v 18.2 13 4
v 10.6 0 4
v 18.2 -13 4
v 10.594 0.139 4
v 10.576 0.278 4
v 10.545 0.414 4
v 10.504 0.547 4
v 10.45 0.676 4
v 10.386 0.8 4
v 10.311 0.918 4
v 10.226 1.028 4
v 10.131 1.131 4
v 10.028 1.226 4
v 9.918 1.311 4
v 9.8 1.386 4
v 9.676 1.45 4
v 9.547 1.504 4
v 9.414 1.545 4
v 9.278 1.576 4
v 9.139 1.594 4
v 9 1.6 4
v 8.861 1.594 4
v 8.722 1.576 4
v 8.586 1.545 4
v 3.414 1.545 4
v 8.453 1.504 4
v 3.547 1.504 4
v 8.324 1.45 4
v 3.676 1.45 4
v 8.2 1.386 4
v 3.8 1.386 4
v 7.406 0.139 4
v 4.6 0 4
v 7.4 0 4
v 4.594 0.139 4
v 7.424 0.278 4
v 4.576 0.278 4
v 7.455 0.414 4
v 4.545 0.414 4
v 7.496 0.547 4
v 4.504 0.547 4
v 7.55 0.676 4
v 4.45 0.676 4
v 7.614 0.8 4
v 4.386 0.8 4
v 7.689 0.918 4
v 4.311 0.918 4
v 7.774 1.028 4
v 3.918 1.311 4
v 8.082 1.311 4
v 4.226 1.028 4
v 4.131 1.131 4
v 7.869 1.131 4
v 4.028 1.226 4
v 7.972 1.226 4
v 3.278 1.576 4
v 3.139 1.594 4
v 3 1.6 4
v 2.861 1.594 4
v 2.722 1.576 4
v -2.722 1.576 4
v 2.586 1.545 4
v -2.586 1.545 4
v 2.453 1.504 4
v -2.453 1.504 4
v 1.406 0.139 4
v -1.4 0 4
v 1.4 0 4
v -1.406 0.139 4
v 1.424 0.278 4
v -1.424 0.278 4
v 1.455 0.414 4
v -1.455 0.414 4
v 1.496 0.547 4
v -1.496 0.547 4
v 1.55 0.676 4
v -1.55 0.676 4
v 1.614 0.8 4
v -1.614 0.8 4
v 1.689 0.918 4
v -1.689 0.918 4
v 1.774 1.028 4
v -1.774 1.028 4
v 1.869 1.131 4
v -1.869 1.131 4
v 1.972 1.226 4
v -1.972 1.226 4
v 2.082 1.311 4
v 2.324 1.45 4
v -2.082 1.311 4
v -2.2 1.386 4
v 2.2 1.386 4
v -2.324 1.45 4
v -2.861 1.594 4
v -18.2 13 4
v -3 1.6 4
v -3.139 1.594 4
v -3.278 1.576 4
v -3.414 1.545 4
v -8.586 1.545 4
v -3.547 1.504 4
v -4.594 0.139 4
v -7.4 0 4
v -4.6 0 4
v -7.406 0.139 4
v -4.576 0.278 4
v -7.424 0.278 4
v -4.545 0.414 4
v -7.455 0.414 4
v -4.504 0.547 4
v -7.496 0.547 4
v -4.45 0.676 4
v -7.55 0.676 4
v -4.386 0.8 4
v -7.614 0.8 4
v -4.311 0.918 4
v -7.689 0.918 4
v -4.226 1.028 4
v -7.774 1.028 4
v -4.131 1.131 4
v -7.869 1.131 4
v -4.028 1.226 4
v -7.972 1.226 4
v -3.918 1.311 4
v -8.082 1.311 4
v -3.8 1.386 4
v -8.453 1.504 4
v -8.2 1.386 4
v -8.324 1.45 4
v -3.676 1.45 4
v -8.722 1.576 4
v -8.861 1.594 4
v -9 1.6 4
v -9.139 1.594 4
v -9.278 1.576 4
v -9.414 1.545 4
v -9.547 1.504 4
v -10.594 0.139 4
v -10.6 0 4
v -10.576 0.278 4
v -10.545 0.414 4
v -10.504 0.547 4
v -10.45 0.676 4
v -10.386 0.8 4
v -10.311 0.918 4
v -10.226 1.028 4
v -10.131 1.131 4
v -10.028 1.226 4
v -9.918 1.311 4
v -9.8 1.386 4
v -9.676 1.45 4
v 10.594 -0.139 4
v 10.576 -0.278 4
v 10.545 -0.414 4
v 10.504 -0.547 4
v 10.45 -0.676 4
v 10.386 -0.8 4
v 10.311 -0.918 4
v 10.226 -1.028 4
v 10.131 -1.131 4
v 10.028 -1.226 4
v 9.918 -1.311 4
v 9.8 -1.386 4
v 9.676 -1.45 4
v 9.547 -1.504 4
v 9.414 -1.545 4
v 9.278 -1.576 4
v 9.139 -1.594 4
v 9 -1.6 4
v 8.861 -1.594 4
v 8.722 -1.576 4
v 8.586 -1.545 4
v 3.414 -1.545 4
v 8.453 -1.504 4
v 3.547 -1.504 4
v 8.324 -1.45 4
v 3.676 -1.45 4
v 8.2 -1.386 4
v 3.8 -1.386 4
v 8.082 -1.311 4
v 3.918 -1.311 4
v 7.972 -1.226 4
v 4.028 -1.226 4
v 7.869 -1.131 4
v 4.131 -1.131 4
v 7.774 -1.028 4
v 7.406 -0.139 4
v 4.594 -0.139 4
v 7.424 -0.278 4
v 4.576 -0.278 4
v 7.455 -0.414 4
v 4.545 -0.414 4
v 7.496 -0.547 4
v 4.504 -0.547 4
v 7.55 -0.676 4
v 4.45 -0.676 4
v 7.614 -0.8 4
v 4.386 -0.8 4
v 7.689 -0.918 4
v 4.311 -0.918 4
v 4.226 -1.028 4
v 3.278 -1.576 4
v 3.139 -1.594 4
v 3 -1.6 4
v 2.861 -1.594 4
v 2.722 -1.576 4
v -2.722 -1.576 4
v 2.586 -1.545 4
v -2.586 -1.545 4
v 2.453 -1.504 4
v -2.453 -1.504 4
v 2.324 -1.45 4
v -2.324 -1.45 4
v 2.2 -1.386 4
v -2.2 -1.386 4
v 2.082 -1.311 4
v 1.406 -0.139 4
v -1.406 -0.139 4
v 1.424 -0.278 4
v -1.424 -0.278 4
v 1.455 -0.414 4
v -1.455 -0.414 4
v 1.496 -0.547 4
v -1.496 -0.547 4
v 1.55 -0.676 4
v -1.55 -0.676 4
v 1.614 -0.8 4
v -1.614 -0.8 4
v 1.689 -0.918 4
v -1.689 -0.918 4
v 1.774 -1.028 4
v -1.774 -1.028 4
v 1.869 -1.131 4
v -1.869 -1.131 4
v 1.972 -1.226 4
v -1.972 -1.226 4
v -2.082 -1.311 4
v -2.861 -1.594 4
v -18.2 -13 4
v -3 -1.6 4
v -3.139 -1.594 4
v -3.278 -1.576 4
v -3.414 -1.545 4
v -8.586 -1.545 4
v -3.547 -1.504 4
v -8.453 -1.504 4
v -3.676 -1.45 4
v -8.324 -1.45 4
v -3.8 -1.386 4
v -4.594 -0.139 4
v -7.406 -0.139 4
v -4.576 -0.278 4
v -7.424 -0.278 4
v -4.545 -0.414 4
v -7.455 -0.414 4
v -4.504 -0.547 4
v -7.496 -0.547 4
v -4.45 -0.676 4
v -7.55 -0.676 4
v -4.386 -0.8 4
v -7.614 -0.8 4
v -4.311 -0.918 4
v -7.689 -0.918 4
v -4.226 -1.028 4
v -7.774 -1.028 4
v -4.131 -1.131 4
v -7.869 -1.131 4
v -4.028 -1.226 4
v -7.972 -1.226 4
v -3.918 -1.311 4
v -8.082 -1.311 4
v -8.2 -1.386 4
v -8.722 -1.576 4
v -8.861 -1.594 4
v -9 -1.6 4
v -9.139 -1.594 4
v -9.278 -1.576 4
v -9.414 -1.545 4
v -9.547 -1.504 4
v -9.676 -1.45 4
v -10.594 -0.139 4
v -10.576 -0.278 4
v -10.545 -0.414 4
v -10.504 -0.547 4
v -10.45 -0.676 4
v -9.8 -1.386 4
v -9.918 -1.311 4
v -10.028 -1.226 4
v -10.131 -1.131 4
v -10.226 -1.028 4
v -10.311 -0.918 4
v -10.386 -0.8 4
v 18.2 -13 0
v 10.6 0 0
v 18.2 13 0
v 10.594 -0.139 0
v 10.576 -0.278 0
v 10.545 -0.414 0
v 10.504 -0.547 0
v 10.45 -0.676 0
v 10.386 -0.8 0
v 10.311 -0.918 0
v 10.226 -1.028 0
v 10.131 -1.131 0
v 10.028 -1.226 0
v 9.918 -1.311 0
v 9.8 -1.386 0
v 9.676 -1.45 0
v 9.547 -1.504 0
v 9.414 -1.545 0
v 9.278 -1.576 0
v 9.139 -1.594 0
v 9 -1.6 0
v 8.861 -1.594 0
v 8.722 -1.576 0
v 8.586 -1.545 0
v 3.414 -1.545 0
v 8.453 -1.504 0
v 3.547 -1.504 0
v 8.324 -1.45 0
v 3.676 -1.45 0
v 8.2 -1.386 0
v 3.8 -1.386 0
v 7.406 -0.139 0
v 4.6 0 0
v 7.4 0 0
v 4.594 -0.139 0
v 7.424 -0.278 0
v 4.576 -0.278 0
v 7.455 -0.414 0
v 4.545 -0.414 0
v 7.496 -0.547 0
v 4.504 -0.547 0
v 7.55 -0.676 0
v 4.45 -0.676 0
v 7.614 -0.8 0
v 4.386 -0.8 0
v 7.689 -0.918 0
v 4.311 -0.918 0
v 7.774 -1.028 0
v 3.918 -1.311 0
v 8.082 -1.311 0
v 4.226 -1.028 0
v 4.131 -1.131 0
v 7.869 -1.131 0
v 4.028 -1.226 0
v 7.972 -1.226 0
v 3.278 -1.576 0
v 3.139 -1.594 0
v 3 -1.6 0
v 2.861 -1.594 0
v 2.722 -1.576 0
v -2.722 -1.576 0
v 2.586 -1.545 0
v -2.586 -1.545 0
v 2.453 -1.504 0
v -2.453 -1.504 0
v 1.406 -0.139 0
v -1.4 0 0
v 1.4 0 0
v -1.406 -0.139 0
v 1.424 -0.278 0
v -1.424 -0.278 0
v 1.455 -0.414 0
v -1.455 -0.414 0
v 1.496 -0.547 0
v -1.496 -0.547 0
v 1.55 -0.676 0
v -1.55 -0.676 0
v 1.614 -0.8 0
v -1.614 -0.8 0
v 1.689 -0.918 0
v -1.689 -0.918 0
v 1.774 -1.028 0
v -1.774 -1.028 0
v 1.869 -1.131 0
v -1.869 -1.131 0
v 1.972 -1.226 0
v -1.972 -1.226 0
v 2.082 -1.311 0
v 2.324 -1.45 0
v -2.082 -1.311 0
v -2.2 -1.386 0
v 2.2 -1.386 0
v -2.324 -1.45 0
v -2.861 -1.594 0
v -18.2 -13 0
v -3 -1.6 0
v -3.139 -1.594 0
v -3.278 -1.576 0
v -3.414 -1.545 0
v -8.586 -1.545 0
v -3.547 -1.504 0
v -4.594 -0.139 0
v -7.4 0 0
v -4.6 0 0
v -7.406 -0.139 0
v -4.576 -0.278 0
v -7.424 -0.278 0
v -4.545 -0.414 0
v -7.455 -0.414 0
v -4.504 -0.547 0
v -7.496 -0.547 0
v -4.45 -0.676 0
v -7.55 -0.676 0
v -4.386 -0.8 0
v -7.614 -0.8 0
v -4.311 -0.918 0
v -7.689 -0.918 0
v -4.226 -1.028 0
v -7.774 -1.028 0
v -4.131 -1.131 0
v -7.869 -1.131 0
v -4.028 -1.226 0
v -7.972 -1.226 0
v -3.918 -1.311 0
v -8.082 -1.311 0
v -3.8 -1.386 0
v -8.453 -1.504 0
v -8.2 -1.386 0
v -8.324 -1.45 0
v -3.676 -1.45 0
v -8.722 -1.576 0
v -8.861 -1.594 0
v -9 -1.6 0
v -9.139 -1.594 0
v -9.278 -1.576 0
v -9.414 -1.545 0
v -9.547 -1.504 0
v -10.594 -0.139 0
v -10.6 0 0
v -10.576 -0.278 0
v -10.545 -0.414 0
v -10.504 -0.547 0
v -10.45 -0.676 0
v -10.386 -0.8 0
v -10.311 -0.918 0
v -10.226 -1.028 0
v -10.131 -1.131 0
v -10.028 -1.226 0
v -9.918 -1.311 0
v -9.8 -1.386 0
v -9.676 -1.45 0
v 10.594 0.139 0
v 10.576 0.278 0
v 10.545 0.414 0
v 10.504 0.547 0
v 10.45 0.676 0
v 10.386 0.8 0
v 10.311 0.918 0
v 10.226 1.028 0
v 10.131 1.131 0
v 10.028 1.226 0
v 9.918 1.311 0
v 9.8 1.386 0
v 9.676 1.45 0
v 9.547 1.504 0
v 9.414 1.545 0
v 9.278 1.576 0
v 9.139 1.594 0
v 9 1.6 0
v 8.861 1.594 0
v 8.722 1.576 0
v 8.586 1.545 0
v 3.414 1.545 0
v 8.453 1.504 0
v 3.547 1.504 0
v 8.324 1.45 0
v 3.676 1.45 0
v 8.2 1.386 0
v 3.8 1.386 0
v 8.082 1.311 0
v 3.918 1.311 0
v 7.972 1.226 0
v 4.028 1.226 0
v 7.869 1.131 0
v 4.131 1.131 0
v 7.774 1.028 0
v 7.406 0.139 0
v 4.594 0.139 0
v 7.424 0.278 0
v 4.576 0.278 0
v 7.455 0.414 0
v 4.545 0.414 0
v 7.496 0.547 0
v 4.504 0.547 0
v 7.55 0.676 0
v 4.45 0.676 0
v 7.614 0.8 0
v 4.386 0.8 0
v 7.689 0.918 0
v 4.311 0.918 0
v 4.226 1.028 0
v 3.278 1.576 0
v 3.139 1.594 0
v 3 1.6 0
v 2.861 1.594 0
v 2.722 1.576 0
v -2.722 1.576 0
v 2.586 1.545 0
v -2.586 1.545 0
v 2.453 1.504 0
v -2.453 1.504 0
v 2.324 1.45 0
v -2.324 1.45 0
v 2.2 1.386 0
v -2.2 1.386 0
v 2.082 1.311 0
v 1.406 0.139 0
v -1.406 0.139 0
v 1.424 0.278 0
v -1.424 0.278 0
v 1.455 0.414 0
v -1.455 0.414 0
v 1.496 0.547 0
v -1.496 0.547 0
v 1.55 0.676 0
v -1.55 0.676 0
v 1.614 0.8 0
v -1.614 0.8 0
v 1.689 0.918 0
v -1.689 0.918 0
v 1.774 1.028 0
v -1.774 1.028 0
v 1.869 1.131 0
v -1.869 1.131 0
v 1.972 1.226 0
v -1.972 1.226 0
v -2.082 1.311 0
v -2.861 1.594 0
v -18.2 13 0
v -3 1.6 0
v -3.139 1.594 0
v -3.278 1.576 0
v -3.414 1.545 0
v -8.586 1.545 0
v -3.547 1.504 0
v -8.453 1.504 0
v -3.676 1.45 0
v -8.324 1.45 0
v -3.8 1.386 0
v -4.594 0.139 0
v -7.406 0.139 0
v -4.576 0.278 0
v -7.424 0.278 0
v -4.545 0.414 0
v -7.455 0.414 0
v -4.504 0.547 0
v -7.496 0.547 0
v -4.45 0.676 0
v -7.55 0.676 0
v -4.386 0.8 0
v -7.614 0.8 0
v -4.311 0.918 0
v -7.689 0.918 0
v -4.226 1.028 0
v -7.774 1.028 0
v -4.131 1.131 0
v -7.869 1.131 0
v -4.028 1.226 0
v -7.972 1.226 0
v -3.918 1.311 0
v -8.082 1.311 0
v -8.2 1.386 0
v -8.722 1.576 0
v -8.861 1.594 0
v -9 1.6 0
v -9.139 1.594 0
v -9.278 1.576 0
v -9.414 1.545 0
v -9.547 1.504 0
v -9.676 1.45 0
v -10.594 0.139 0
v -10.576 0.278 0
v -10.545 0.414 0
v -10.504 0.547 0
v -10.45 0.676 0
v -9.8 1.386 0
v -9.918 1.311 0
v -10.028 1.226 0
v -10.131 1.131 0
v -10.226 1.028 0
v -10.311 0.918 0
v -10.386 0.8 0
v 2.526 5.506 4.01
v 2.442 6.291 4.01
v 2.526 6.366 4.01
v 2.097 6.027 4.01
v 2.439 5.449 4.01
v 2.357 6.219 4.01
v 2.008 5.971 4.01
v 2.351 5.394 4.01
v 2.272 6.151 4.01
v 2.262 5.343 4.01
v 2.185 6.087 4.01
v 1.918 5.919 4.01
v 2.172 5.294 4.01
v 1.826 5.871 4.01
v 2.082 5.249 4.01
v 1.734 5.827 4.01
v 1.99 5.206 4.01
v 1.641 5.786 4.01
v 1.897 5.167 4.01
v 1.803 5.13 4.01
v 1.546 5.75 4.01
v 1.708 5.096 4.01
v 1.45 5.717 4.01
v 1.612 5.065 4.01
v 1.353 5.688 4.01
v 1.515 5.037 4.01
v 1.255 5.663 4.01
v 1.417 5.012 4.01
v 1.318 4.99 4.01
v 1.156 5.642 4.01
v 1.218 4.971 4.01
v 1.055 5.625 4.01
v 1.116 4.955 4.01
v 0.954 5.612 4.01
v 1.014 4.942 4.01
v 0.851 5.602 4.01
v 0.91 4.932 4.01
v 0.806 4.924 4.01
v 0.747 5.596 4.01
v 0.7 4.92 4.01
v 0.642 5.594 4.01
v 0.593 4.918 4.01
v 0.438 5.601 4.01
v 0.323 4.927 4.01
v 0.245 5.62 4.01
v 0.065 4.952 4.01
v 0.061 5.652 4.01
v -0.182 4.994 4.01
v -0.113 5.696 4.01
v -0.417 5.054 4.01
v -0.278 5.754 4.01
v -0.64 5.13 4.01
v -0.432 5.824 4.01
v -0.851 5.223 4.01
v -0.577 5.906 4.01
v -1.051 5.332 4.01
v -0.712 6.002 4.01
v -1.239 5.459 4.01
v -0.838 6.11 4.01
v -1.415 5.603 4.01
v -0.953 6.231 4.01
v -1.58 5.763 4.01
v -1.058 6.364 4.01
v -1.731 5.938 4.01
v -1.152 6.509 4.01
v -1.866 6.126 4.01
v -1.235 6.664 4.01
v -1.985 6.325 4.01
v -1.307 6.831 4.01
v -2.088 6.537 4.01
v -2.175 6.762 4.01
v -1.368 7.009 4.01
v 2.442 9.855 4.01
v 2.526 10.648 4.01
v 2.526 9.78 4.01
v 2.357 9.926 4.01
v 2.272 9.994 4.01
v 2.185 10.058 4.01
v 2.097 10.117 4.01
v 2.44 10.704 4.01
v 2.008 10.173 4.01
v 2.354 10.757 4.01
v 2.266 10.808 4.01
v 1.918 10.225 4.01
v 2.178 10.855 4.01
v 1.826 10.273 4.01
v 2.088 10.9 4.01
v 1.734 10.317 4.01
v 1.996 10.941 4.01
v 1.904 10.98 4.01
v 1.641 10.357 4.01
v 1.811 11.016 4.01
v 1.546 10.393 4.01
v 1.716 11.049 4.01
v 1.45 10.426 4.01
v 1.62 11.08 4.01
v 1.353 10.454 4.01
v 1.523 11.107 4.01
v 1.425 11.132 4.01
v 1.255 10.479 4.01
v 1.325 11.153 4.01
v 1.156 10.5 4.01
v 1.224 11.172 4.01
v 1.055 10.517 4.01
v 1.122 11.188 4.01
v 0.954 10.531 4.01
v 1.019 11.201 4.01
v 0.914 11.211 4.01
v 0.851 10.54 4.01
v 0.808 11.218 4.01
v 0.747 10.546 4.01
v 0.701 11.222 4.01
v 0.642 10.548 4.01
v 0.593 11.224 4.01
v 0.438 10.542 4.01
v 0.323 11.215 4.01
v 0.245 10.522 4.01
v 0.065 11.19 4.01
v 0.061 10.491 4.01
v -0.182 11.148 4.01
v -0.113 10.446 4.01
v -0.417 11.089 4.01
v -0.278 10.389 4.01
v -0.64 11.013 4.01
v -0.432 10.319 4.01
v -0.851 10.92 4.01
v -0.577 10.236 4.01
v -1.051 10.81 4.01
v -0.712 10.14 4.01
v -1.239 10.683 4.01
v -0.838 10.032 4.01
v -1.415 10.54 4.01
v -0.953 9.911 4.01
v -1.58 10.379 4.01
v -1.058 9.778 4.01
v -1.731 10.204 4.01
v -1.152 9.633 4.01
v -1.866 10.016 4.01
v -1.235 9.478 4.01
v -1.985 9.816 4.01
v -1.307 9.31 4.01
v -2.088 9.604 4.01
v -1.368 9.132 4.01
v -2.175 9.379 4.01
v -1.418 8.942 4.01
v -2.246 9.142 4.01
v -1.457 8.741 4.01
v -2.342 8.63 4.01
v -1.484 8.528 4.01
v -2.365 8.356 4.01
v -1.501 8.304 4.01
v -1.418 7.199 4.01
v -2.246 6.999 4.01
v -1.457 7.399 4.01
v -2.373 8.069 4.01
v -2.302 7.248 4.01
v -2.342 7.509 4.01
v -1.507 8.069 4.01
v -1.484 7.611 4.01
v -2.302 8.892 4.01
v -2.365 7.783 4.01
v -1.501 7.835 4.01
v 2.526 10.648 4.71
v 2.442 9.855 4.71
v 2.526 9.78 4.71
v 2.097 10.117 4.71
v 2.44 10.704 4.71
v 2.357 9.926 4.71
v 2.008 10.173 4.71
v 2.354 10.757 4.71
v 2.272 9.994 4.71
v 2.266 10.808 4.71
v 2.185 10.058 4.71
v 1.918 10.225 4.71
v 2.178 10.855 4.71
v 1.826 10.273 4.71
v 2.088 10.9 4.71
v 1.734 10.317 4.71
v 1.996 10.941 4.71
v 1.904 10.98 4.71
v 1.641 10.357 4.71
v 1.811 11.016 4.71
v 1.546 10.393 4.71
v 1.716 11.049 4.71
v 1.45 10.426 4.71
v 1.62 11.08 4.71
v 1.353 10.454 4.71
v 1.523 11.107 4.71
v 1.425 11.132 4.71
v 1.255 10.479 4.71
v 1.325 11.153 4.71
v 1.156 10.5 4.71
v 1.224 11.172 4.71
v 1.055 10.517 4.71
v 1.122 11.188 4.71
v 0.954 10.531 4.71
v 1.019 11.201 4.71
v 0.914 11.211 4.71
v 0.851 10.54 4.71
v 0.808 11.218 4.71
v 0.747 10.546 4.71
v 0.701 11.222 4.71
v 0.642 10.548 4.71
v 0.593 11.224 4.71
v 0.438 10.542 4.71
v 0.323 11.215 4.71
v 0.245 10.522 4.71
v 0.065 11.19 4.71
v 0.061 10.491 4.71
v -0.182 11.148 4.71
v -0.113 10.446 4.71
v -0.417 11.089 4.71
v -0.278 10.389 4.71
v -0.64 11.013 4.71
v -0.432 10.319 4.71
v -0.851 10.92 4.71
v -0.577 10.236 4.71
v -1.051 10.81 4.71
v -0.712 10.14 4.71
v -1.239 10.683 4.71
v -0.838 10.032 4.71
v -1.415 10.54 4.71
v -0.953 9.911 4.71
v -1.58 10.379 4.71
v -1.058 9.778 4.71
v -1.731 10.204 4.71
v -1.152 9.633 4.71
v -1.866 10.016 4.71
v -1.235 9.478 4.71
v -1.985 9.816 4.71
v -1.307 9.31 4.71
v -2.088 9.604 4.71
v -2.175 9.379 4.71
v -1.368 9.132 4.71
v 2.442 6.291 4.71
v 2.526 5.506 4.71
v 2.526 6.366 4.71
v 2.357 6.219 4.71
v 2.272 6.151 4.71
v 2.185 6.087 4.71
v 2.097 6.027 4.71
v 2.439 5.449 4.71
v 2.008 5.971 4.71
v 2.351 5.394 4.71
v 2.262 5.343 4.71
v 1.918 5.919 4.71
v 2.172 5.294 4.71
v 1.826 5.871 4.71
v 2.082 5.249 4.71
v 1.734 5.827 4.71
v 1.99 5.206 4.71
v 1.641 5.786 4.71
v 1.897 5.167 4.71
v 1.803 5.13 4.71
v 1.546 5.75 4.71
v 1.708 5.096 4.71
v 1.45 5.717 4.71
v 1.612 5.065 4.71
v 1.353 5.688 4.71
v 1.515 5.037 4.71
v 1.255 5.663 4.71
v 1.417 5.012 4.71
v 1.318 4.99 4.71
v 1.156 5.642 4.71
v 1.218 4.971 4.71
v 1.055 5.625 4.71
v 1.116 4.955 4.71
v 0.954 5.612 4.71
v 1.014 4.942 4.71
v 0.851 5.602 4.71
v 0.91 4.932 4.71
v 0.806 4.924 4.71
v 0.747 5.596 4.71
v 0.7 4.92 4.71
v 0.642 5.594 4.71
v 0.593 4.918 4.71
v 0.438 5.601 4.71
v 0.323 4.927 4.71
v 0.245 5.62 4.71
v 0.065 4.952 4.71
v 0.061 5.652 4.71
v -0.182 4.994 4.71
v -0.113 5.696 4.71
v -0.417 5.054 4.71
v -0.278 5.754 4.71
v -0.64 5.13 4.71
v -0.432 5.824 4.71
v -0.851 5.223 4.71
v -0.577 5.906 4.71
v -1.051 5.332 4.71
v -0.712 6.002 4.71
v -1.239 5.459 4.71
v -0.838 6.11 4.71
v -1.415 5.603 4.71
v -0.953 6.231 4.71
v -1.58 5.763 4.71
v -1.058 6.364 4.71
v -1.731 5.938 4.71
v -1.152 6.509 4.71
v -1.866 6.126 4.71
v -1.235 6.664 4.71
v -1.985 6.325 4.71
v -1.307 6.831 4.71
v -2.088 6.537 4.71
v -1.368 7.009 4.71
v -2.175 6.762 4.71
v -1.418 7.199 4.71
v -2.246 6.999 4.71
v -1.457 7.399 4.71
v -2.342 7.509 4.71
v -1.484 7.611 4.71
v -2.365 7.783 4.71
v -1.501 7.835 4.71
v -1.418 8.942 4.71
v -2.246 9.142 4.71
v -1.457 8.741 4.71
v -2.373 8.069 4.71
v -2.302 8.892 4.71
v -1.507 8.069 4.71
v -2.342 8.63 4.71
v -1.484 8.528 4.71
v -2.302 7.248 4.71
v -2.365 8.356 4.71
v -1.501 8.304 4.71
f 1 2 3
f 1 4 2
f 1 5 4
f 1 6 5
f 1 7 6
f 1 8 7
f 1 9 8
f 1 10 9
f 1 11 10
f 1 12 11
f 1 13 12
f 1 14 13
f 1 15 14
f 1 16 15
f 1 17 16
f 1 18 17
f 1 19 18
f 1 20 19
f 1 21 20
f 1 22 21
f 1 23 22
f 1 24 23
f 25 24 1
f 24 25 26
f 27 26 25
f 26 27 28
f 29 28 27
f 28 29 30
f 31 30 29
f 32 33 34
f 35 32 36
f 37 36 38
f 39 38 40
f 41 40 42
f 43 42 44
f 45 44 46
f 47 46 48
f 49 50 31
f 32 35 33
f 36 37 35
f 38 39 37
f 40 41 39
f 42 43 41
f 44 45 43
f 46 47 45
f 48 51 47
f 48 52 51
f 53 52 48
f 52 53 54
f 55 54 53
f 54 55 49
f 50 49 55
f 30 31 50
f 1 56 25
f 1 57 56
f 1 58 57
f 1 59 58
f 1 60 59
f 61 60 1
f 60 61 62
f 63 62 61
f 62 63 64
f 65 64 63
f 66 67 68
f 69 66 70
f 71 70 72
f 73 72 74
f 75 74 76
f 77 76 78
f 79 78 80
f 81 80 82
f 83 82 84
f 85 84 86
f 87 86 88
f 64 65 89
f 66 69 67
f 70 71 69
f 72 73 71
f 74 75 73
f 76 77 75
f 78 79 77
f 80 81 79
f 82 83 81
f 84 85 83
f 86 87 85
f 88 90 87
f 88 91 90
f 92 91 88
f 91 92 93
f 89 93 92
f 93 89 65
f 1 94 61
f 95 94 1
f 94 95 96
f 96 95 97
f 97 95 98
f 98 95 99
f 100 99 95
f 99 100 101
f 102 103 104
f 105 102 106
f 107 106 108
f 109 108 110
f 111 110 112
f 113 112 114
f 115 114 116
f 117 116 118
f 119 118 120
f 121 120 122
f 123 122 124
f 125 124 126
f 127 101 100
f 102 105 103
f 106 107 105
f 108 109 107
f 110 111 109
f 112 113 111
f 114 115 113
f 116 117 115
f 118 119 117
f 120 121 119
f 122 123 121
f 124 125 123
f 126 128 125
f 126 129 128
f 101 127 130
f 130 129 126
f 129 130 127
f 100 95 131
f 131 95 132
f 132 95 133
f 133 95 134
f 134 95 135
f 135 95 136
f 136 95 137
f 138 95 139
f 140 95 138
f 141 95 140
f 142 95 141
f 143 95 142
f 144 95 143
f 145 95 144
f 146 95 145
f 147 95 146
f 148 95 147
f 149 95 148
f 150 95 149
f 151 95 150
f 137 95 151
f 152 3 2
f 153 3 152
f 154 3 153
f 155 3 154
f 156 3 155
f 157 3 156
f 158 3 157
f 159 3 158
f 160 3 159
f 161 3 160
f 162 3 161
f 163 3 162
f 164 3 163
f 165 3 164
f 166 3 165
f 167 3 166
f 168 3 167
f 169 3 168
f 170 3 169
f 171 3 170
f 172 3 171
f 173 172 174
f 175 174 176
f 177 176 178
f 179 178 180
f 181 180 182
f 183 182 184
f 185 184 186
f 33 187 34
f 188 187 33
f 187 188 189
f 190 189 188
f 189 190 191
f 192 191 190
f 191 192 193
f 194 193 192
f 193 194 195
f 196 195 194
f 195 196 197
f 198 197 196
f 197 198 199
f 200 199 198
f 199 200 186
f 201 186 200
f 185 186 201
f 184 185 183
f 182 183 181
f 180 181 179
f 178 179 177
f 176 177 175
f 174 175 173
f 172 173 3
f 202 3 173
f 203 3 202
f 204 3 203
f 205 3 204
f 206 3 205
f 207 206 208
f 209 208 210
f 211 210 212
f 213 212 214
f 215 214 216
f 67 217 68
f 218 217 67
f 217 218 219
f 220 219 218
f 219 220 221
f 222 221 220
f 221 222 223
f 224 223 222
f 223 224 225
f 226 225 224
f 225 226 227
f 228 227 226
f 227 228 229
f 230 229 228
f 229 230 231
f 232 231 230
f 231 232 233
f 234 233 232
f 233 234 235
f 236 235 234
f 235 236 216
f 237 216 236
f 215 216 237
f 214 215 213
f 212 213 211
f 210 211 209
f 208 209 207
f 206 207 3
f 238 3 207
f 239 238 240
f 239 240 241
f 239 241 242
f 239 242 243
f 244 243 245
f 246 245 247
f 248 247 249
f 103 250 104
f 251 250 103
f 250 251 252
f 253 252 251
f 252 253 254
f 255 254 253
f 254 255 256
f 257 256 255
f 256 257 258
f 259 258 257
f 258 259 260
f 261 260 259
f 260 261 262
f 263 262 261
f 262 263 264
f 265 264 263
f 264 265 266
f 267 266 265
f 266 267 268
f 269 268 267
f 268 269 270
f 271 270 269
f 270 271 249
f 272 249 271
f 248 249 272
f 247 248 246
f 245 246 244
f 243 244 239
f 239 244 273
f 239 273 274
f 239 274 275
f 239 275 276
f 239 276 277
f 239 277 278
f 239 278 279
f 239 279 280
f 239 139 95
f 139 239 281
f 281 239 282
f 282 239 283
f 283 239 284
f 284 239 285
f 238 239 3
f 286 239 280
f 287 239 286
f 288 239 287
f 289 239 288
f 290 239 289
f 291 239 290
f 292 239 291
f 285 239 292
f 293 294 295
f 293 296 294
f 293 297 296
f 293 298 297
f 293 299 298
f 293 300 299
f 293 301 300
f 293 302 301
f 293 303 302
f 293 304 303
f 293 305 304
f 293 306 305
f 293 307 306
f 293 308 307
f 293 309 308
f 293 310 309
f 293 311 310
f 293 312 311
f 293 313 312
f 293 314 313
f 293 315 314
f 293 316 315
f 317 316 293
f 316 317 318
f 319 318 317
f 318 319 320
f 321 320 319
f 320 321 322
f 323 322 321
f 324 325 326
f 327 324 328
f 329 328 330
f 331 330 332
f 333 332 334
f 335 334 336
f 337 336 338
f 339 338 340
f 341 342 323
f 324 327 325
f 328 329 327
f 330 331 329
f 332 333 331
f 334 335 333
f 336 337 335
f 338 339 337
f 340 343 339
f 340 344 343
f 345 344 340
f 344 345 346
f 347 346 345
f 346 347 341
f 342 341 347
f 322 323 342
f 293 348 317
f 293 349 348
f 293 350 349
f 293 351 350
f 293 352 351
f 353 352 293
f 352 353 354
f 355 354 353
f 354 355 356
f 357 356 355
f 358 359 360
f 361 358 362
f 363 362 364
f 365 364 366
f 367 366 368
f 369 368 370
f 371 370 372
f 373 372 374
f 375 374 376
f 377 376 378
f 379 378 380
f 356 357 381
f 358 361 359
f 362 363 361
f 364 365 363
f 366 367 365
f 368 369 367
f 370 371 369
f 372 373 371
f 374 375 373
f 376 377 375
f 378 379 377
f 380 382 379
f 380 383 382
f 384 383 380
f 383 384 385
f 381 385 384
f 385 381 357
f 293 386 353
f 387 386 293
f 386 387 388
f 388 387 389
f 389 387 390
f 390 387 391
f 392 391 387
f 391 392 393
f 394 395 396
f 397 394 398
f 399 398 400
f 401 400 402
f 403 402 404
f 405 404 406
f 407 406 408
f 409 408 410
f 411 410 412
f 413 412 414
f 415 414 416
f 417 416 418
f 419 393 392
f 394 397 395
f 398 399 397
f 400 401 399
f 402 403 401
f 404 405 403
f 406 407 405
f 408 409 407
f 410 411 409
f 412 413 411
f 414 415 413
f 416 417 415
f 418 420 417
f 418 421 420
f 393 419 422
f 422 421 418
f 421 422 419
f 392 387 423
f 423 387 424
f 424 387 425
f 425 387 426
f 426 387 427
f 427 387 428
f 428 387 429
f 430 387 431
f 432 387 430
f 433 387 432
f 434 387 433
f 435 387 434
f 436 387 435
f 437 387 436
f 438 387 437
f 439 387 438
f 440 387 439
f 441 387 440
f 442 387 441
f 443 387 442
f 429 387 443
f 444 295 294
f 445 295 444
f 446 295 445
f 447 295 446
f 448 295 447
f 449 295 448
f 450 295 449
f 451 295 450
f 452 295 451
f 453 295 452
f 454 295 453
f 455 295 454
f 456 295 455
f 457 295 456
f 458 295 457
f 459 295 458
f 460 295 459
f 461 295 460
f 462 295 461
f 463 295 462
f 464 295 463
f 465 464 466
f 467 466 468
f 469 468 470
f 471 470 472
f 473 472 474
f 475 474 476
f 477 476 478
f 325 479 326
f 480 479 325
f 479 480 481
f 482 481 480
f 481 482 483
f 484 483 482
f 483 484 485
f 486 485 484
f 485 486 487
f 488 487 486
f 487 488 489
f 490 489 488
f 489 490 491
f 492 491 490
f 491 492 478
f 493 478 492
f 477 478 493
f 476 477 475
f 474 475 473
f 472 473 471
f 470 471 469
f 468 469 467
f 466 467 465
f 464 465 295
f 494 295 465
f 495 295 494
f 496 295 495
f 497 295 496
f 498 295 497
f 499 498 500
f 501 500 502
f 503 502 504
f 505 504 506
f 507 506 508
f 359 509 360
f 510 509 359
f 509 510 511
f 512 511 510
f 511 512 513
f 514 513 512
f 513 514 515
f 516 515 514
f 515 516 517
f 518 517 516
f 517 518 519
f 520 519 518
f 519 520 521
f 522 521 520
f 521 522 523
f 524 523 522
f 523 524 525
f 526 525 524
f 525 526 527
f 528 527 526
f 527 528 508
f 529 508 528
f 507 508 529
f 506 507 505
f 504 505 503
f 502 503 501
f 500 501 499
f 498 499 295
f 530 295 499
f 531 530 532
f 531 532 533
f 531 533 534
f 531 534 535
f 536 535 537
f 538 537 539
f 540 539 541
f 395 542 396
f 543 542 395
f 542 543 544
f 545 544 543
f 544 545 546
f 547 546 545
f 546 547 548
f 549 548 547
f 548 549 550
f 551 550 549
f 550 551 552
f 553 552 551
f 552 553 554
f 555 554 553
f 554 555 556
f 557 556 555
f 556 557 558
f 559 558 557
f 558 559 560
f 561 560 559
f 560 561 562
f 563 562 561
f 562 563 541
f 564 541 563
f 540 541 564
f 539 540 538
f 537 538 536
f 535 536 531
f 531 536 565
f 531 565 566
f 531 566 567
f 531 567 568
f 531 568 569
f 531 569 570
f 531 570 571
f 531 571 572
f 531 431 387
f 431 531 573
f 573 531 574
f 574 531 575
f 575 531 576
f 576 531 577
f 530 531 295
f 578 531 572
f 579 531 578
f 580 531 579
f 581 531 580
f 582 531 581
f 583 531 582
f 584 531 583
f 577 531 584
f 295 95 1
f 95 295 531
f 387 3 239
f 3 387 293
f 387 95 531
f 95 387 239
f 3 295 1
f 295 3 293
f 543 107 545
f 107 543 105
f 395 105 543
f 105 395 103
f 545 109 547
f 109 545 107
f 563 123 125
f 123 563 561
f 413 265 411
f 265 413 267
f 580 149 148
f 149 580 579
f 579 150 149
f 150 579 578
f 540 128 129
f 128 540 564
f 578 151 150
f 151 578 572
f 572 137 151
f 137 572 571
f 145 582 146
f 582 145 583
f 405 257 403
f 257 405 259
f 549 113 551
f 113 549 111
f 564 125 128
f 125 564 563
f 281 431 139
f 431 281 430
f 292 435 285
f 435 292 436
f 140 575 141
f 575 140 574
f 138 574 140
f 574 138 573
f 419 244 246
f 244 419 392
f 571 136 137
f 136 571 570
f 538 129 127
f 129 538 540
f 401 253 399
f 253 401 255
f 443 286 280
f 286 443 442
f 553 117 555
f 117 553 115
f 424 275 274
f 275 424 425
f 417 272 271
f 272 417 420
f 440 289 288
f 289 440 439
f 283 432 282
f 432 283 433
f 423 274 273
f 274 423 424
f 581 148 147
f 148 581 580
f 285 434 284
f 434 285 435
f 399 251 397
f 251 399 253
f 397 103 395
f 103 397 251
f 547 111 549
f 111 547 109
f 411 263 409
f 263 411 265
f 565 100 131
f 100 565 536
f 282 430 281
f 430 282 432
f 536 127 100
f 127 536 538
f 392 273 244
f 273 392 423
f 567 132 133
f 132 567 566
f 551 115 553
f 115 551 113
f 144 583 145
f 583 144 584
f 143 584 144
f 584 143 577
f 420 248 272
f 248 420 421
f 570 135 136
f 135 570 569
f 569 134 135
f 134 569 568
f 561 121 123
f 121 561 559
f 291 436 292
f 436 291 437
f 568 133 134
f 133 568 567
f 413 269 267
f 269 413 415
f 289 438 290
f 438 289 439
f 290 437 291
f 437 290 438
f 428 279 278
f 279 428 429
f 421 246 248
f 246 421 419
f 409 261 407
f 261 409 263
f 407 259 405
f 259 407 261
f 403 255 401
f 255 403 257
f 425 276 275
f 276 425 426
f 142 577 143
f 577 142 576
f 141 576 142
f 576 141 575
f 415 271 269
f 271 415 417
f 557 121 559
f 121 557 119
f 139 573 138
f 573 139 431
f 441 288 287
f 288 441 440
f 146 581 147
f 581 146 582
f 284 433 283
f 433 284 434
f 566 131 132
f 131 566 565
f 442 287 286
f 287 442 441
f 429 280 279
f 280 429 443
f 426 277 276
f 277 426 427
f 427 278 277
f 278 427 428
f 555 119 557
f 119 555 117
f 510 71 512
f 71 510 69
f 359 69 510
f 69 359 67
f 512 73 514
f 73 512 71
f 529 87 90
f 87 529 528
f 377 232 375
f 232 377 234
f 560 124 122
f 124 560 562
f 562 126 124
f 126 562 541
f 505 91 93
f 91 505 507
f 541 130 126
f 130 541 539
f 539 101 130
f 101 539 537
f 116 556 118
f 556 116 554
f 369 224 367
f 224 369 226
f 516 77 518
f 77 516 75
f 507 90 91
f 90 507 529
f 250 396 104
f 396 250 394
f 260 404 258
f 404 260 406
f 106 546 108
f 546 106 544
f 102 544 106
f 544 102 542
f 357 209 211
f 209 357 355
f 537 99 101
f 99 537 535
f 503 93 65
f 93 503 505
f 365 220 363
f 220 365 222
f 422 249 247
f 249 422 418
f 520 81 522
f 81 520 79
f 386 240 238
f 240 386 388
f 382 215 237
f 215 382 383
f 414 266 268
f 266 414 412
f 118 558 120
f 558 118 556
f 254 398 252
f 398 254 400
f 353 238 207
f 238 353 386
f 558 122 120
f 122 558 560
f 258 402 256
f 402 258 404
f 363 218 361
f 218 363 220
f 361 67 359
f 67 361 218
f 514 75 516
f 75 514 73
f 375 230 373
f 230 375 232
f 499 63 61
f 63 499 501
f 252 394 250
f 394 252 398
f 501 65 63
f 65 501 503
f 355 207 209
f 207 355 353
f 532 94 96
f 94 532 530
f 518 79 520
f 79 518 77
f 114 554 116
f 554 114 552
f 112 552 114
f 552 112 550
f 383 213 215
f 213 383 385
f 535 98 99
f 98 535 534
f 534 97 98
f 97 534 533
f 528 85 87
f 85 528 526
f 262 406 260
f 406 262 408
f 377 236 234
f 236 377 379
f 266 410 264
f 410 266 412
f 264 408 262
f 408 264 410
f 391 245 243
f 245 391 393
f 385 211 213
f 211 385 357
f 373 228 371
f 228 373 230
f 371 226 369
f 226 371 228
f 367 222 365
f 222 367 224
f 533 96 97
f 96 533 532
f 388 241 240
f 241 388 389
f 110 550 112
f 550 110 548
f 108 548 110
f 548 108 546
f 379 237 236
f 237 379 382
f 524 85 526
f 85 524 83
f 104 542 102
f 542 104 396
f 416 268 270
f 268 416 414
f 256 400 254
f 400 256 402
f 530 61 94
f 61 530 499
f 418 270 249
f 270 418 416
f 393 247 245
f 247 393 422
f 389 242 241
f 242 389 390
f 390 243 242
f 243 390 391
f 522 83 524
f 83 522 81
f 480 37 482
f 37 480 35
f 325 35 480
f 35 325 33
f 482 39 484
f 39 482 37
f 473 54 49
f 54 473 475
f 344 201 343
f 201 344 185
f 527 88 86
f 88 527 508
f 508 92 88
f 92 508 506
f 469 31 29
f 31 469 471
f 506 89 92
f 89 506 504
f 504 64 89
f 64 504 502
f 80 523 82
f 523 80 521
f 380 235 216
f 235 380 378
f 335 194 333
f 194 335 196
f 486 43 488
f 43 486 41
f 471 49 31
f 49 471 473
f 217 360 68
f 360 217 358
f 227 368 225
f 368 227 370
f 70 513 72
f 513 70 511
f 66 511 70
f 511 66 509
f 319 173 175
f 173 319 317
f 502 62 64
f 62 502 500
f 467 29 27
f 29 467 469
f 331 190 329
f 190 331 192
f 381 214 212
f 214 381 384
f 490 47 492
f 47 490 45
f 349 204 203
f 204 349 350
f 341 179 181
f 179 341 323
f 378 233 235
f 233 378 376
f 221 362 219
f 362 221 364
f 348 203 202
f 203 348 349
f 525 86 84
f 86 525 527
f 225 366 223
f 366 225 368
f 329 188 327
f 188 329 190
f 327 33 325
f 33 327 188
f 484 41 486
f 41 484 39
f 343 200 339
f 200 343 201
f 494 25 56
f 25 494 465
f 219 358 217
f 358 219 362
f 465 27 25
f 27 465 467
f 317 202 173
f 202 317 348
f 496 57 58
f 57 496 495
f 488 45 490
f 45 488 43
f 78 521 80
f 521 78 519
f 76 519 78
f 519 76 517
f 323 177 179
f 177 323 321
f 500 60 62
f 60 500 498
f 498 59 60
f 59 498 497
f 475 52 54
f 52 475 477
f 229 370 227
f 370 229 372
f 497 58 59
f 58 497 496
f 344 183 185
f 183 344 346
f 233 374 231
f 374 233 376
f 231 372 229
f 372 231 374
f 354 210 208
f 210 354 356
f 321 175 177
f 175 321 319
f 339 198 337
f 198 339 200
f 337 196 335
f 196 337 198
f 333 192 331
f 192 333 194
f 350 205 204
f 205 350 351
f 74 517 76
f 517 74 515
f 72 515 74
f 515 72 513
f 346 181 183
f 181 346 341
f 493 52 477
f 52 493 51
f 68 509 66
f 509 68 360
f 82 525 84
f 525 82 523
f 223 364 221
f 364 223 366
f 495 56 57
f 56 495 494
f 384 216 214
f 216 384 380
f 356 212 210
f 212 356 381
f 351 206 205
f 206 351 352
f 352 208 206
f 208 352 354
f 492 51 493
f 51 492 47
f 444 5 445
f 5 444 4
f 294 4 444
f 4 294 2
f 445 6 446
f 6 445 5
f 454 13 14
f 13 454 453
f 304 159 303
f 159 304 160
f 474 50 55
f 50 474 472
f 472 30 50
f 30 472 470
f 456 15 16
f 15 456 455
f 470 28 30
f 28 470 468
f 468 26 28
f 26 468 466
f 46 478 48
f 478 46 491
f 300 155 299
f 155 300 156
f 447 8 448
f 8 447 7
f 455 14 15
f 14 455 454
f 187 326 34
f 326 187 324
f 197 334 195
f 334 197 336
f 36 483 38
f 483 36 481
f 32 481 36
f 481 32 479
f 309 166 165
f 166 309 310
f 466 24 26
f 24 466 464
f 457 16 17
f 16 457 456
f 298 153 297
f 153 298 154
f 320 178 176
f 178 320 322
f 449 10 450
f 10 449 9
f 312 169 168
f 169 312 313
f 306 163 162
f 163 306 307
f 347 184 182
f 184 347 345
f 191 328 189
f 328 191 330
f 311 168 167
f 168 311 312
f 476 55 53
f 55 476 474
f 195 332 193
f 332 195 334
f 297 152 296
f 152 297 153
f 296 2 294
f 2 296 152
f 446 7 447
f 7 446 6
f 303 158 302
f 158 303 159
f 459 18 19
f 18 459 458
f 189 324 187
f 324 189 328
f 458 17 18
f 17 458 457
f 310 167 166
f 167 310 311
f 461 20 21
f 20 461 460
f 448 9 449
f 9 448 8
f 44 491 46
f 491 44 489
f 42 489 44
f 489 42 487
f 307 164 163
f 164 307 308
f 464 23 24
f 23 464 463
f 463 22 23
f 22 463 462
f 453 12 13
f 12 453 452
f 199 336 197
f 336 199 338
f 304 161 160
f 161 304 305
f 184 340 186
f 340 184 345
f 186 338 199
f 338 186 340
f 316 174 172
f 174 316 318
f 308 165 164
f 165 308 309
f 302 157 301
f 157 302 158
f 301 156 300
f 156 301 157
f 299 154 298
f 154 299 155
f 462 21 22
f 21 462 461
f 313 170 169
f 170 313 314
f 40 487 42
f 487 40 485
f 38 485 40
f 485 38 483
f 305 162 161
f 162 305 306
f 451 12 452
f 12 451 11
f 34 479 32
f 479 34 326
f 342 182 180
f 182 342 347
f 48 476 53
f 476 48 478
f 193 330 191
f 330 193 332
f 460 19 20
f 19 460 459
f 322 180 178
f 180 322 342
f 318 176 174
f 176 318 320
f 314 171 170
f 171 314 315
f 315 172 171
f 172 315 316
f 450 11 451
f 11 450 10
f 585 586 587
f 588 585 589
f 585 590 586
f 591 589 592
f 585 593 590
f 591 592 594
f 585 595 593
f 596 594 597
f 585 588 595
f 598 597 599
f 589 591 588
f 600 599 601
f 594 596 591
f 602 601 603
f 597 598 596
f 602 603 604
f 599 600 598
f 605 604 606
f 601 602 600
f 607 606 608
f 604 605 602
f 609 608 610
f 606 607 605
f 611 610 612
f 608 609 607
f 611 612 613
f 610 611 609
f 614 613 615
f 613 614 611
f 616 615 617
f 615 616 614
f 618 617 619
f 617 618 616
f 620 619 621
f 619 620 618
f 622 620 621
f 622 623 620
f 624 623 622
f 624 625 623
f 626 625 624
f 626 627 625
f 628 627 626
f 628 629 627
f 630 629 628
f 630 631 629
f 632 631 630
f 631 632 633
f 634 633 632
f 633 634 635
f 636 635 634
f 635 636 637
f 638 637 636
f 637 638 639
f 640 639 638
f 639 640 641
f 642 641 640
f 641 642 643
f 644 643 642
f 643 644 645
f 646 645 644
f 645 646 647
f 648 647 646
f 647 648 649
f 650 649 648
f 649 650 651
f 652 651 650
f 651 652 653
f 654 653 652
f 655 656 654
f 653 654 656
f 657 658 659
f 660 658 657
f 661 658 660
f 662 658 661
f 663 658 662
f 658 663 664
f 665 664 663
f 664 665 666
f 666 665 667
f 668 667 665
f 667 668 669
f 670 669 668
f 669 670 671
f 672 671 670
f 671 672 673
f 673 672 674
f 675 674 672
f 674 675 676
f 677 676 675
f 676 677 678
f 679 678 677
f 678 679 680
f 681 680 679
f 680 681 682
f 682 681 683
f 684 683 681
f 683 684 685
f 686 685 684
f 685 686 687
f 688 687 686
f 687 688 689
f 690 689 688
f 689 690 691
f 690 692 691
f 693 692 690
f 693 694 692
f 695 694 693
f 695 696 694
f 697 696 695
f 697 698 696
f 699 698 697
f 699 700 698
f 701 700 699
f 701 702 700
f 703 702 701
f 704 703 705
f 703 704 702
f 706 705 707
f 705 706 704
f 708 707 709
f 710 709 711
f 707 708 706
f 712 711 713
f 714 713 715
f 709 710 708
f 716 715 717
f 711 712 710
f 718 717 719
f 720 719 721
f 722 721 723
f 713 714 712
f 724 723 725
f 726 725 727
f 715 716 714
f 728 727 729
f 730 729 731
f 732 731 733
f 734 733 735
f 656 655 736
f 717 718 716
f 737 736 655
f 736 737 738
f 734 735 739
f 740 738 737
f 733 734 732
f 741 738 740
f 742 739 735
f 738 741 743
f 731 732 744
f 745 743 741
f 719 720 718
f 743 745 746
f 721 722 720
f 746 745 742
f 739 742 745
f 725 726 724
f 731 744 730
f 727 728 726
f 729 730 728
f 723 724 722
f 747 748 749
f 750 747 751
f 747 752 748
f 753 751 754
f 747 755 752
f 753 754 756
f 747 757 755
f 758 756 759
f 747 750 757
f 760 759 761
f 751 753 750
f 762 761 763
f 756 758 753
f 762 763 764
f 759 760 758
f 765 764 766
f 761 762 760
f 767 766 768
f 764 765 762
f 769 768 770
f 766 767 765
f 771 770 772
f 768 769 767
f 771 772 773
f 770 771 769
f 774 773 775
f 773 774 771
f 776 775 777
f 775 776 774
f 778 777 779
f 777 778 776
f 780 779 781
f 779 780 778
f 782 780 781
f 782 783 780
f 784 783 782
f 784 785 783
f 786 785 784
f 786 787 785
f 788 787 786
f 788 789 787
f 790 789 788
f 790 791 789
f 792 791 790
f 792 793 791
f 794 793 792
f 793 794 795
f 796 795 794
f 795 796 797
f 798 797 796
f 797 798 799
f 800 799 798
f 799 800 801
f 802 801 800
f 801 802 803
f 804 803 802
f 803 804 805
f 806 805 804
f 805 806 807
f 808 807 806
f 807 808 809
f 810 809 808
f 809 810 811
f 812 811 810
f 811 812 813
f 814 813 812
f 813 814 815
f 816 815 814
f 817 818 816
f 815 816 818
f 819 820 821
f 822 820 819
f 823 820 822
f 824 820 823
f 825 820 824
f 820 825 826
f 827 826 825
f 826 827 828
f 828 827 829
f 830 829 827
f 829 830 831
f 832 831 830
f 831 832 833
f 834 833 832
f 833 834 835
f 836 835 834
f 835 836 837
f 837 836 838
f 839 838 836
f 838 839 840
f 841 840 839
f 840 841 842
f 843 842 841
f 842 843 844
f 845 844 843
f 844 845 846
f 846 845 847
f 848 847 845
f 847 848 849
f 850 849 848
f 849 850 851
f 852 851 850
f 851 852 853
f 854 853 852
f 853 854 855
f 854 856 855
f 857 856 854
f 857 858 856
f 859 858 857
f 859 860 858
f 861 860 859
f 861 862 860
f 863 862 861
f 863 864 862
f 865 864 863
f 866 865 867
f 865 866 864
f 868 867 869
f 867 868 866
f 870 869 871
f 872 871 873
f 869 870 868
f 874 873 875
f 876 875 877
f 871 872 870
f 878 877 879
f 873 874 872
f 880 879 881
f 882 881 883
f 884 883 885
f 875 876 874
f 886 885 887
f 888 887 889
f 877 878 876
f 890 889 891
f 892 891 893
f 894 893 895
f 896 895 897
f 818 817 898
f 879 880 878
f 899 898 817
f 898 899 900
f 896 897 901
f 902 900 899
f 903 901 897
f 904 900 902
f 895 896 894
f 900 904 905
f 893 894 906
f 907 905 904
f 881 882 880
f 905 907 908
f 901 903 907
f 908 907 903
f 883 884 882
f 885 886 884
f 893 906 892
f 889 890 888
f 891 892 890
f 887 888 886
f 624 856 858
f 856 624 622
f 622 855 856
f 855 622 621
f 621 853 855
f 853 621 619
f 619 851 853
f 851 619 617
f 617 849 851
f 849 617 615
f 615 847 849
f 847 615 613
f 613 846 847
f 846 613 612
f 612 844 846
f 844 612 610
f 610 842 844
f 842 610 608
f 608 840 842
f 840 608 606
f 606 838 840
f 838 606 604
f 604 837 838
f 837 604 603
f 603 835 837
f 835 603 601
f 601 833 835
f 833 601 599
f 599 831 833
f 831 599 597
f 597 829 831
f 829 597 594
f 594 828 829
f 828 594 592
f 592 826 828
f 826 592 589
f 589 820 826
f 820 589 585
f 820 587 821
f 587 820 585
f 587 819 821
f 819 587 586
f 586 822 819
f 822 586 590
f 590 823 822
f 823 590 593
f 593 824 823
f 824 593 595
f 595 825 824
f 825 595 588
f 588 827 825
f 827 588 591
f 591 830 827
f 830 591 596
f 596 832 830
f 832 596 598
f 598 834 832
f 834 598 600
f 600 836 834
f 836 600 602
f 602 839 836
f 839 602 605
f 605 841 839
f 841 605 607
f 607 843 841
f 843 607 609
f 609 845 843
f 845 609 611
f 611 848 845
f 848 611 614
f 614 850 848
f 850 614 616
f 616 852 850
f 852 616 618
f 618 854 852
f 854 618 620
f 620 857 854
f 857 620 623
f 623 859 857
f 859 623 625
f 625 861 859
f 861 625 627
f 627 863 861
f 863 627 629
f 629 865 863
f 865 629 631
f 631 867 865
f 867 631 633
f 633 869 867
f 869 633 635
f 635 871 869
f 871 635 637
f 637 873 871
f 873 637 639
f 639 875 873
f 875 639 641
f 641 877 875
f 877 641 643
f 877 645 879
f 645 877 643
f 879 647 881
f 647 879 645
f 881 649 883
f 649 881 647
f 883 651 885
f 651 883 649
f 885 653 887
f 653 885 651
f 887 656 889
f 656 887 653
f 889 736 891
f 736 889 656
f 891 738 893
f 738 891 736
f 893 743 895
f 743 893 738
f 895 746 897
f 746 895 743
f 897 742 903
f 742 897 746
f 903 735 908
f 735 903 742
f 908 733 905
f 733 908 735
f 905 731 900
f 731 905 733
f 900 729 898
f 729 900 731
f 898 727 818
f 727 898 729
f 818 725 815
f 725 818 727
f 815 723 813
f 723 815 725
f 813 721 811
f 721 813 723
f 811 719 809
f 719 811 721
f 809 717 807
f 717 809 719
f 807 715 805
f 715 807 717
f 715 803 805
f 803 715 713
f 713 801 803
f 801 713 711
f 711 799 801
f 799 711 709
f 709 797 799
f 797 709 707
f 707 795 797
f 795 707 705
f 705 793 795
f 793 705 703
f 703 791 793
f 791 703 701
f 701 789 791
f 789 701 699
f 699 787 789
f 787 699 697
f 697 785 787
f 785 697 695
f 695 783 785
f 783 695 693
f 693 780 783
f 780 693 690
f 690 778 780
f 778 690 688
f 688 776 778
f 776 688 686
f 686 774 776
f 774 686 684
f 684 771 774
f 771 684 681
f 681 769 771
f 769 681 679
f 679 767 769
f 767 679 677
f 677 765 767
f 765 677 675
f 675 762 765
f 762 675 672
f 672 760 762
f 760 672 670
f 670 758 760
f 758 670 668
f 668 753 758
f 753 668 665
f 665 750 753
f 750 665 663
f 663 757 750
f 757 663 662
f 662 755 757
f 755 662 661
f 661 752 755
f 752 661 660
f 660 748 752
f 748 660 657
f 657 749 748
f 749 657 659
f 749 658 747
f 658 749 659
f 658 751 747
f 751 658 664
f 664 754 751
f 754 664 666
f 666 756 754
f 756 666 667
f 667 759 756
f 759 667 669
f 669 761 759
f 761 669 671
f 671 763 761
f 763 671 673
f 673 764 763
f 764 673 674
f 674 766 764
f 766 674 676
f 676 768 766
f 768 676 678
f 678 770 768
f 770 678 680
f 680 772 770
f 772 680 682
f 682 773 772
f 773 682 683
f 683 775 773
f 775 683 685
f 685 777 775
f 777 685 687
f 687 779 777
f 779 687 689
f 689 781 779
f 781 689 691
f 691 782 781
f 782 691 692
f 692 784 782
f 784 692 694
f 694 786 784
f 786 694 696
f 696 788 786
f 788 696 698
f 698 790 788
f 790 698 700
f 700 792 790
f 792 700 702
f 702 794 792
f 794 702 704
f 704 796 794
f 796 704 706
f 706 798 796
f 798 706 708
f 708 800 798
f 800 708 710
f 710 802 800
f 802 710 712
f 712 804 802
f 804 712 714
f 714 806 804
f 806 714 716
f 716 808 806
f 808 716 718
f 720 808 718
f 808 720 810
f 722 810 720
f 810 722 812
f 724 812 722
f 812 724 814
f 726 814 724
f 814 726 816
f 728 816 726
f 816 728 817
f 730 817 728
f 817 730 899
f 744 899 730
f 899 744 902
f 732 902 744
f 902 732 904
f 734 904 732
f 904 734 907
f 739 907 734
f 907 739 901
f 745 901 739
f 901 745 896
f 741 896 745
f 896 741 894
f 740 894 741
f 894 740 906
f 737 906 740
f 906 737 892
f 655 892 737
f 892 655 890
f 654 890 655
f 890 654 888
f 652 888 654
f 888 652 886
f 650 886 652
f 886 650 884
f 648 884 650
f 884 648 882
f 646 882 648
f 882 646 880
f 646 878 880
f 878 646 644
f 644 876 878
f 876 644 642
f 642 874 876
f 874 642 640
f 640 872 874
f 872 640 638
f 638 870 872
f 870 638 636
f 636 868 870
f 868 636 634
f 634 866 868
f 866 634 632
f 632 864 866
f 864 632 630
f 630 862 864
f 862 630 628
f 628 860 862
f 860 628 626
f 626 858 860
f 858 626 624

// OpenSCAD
// file: common.scad
// ============================================================
// D29 牽引馬達教學模型 - 共用參數與輔助模組
// Shared parameters & helper modules for the traction-motor
// teaching aid, inspired by the "Type D29 Traction Motor"
// museum exhibit panel (Electromagnet Frame / Armature /
// Cables / Bearing / Gear).
// ============================================================

$fn = 72;

// ---- global fit ----
TOL      = 0.35;  // radial clearance for rotating/sliding fits
SCREW_D  = 3.2;    // M3 clearance hole
PILOT_D  = 2.6;    // M3 self-tap pilot hole (into a printed boss)
HEAD_D   = 6.4;    // M3 pan-head clearance
HEAD_H   = 3.2;

// ---- gears (齒輪 Gear drive to the wheel) ----
// MCAD's gear() sizes teeth from circular_pitch: pitch_diameter =
// number_of_teeth * circular_pitch / 180. Using the SAME circular
// pitch for both gears is what makes them mesh correctly.
GEAR_CIRC_PITCH = 360;
PINION_TEETH = 16;              // pitch dia. 32 mm -> on the armature
WHEEL_TEETH  = 32;              // pitch dia. 64 mm -> on the wheel axle
GEAR_THICK   = 6;
WHEEL_D      = 90;   // decorative "road wheel" disc driven by the axle gear
GEAR_CENTER_DIST = (PINION_TEETH + WHEEL_TEETH) * GEAR_CIRC_PITCH / 360; // = 48 mm

// ---- shaft / armature (Part B 電樞 Armature) ----
// Laid out sequentially along the shaft so nothing overlaps:
//   [0 .. BEARING_MARGIN]                bare shaft (near bearing journal)
//   [.. + COMM_LEN]                      commutator ring
//   [.. + GAP1]                          bare shaft / air gap
//   [.. + CORE_LEN]                      laminated core (sits inside the frame)
//   [.. + GAP2]                          bare shaft / air gap
//   [.. + DFLAT_LEN]                     D-flat drive end (the pinion sits on
//                                        the last GEAR_THICK mm of it, flush
//                                        with the shaft tip)
SHAFT_D       = 10;
BEARING_MARGIN = 8;
COMM_D        = 24;
COMM_LEN      = 16;
COMM_SEGS     = 12;
GAP1          = 8;
CORE_D        = 40;
CORE_LEN      = 50;
LAMINATION_N  = 12;   // number of simulated lamination grooves
GAP2          = 8;
DFLAT_LEN     = 24;    // length of the flat-sided drive end
DFLAT_CUT     = 2.6;   // material removed from round shaft to make the flat

COMM_Z        = BEARING_MARGIN;
CORE_Z        = COMM_Z + COMM_LEN + GAP1;
DFLAT_Z       = CORE_Z + CORE_LEN + GAP2;
SHAFT_LEN     = DFLAT_Z + DFLAT_LEN;
GEAR_Z        = SHAFT_LEN - GEAR_THICK;   // the pinion sits flush with the shaft tip
PIN_Z         = GEAR_Z + GEAR_THICK/2;    // retaining-pin hole, through the pinion's middle

// ---- frame / stator housing (Part A 磁框 Electromagnet Frame) ----
FRAME_ID     = CORE_D + 2*3.5;  // 3.5 mm air-gap each side
FRAME_WALL   = 7;
FRAME_OD     = FRAME_ID + 2*FRAME_WALL;
FRAME_LEN    = CORE_LEN + 20;
POLE_COUNT   = 4;
POLE_W       = 16;
POLE_PROJ    = 4;
// where the frame's own local z=0 sits once slid over the armature,
// so it is centred on the laminated core
FRAME_OFFSET = CORE_Z - (FRAME_LEN - CORE_LEN)/2;

// ---- bearing end caps (Part D 軸承 Bearing) ----
// slightly wider than the frame tube so the caps form a shoulder
// that rests against the stand's support collars
CAP_D        = FRAME_OD + 10;
CAP_T        = 9;
CAP_LIP_H    = 6;              // lip that sits inside the frame bore
BOLT_PCD     = FRAME_OD - 16;  // bolt circle diameter, 4 bolts

// ---- cable entry cover (Part C 引線 Cables) ----
CABLE_HOLE_D = 3.2;
CABLE_COUNT  = 4;

// ---- base display stand ----
// All shaft-axis parts (frame, armature, wheel axle) share ONE global
// layout: the shaft runs along +X at height SHAFT_HEIGHT. A part's own
// local Z axis (its "along the shaft" axis) is mapped onto global X by
// rotate([0,90,0]); its local z=0 lands at the given global X offset.
PLATE_W       = 200;
PLATE_D       = 150;
PLATE_T       = 6;
SHAFT_HEIGHT  = 55;   // height of the armature/wheel axle centreline above the base
WHEEL_AXLE_D  = 6;
COLLAR_OD     = FRAME_OD + 20;
COLLAR_T      = 10;

MOTOR_COLLAR_X1 = 40;                       // frame's local z=0 (near/commutator end)
MOTOR_COLLAR_X2 = MOTOR_COLLAR_X1 + FRAME_LEN;  // frame's local z=FRAME_LEN (far end)
ARMATURE_X0     = MOTOR_COLLAR_X1 - FRAME_OFFSET;  // armature's local z=0, in global X
GEAR_MESH_X     = ARMATURE_X0 + PIN_Z;      // global X where the pinion sits

WHEEL_POST_X1   = GEAR_MESH_X - 17;
WHEEL_POST_X2   = GEAR_MESH_X + 17;

// ---- text label helper ----
module label_text(txt, size=5.5, depth=0.8, font="WenQuanYi Zen Hei:style=Regular") {
    linear_extrude(height=depth)
        text(txt, size=size, halign="center", valign="center", font=font);
}

module bolt_clearance(h=20) {
    union() {
        cylinder(d=SCREW_D, h=h, center=true);
        translate([0,0,h/2-HEAD_H/2])
            cylinder(d=HEAD_D, h=HEAD_H+0.5, center=true);
    }
}

module bolt_pilot(h=20) {
    cylinder(d=PILOT_D, h=h);
}
// main file
// Part C - 引線 Cables entry cover. Prints flat, as modelled.
include <common.scad>
use <parts.scad>
cable_cover();
